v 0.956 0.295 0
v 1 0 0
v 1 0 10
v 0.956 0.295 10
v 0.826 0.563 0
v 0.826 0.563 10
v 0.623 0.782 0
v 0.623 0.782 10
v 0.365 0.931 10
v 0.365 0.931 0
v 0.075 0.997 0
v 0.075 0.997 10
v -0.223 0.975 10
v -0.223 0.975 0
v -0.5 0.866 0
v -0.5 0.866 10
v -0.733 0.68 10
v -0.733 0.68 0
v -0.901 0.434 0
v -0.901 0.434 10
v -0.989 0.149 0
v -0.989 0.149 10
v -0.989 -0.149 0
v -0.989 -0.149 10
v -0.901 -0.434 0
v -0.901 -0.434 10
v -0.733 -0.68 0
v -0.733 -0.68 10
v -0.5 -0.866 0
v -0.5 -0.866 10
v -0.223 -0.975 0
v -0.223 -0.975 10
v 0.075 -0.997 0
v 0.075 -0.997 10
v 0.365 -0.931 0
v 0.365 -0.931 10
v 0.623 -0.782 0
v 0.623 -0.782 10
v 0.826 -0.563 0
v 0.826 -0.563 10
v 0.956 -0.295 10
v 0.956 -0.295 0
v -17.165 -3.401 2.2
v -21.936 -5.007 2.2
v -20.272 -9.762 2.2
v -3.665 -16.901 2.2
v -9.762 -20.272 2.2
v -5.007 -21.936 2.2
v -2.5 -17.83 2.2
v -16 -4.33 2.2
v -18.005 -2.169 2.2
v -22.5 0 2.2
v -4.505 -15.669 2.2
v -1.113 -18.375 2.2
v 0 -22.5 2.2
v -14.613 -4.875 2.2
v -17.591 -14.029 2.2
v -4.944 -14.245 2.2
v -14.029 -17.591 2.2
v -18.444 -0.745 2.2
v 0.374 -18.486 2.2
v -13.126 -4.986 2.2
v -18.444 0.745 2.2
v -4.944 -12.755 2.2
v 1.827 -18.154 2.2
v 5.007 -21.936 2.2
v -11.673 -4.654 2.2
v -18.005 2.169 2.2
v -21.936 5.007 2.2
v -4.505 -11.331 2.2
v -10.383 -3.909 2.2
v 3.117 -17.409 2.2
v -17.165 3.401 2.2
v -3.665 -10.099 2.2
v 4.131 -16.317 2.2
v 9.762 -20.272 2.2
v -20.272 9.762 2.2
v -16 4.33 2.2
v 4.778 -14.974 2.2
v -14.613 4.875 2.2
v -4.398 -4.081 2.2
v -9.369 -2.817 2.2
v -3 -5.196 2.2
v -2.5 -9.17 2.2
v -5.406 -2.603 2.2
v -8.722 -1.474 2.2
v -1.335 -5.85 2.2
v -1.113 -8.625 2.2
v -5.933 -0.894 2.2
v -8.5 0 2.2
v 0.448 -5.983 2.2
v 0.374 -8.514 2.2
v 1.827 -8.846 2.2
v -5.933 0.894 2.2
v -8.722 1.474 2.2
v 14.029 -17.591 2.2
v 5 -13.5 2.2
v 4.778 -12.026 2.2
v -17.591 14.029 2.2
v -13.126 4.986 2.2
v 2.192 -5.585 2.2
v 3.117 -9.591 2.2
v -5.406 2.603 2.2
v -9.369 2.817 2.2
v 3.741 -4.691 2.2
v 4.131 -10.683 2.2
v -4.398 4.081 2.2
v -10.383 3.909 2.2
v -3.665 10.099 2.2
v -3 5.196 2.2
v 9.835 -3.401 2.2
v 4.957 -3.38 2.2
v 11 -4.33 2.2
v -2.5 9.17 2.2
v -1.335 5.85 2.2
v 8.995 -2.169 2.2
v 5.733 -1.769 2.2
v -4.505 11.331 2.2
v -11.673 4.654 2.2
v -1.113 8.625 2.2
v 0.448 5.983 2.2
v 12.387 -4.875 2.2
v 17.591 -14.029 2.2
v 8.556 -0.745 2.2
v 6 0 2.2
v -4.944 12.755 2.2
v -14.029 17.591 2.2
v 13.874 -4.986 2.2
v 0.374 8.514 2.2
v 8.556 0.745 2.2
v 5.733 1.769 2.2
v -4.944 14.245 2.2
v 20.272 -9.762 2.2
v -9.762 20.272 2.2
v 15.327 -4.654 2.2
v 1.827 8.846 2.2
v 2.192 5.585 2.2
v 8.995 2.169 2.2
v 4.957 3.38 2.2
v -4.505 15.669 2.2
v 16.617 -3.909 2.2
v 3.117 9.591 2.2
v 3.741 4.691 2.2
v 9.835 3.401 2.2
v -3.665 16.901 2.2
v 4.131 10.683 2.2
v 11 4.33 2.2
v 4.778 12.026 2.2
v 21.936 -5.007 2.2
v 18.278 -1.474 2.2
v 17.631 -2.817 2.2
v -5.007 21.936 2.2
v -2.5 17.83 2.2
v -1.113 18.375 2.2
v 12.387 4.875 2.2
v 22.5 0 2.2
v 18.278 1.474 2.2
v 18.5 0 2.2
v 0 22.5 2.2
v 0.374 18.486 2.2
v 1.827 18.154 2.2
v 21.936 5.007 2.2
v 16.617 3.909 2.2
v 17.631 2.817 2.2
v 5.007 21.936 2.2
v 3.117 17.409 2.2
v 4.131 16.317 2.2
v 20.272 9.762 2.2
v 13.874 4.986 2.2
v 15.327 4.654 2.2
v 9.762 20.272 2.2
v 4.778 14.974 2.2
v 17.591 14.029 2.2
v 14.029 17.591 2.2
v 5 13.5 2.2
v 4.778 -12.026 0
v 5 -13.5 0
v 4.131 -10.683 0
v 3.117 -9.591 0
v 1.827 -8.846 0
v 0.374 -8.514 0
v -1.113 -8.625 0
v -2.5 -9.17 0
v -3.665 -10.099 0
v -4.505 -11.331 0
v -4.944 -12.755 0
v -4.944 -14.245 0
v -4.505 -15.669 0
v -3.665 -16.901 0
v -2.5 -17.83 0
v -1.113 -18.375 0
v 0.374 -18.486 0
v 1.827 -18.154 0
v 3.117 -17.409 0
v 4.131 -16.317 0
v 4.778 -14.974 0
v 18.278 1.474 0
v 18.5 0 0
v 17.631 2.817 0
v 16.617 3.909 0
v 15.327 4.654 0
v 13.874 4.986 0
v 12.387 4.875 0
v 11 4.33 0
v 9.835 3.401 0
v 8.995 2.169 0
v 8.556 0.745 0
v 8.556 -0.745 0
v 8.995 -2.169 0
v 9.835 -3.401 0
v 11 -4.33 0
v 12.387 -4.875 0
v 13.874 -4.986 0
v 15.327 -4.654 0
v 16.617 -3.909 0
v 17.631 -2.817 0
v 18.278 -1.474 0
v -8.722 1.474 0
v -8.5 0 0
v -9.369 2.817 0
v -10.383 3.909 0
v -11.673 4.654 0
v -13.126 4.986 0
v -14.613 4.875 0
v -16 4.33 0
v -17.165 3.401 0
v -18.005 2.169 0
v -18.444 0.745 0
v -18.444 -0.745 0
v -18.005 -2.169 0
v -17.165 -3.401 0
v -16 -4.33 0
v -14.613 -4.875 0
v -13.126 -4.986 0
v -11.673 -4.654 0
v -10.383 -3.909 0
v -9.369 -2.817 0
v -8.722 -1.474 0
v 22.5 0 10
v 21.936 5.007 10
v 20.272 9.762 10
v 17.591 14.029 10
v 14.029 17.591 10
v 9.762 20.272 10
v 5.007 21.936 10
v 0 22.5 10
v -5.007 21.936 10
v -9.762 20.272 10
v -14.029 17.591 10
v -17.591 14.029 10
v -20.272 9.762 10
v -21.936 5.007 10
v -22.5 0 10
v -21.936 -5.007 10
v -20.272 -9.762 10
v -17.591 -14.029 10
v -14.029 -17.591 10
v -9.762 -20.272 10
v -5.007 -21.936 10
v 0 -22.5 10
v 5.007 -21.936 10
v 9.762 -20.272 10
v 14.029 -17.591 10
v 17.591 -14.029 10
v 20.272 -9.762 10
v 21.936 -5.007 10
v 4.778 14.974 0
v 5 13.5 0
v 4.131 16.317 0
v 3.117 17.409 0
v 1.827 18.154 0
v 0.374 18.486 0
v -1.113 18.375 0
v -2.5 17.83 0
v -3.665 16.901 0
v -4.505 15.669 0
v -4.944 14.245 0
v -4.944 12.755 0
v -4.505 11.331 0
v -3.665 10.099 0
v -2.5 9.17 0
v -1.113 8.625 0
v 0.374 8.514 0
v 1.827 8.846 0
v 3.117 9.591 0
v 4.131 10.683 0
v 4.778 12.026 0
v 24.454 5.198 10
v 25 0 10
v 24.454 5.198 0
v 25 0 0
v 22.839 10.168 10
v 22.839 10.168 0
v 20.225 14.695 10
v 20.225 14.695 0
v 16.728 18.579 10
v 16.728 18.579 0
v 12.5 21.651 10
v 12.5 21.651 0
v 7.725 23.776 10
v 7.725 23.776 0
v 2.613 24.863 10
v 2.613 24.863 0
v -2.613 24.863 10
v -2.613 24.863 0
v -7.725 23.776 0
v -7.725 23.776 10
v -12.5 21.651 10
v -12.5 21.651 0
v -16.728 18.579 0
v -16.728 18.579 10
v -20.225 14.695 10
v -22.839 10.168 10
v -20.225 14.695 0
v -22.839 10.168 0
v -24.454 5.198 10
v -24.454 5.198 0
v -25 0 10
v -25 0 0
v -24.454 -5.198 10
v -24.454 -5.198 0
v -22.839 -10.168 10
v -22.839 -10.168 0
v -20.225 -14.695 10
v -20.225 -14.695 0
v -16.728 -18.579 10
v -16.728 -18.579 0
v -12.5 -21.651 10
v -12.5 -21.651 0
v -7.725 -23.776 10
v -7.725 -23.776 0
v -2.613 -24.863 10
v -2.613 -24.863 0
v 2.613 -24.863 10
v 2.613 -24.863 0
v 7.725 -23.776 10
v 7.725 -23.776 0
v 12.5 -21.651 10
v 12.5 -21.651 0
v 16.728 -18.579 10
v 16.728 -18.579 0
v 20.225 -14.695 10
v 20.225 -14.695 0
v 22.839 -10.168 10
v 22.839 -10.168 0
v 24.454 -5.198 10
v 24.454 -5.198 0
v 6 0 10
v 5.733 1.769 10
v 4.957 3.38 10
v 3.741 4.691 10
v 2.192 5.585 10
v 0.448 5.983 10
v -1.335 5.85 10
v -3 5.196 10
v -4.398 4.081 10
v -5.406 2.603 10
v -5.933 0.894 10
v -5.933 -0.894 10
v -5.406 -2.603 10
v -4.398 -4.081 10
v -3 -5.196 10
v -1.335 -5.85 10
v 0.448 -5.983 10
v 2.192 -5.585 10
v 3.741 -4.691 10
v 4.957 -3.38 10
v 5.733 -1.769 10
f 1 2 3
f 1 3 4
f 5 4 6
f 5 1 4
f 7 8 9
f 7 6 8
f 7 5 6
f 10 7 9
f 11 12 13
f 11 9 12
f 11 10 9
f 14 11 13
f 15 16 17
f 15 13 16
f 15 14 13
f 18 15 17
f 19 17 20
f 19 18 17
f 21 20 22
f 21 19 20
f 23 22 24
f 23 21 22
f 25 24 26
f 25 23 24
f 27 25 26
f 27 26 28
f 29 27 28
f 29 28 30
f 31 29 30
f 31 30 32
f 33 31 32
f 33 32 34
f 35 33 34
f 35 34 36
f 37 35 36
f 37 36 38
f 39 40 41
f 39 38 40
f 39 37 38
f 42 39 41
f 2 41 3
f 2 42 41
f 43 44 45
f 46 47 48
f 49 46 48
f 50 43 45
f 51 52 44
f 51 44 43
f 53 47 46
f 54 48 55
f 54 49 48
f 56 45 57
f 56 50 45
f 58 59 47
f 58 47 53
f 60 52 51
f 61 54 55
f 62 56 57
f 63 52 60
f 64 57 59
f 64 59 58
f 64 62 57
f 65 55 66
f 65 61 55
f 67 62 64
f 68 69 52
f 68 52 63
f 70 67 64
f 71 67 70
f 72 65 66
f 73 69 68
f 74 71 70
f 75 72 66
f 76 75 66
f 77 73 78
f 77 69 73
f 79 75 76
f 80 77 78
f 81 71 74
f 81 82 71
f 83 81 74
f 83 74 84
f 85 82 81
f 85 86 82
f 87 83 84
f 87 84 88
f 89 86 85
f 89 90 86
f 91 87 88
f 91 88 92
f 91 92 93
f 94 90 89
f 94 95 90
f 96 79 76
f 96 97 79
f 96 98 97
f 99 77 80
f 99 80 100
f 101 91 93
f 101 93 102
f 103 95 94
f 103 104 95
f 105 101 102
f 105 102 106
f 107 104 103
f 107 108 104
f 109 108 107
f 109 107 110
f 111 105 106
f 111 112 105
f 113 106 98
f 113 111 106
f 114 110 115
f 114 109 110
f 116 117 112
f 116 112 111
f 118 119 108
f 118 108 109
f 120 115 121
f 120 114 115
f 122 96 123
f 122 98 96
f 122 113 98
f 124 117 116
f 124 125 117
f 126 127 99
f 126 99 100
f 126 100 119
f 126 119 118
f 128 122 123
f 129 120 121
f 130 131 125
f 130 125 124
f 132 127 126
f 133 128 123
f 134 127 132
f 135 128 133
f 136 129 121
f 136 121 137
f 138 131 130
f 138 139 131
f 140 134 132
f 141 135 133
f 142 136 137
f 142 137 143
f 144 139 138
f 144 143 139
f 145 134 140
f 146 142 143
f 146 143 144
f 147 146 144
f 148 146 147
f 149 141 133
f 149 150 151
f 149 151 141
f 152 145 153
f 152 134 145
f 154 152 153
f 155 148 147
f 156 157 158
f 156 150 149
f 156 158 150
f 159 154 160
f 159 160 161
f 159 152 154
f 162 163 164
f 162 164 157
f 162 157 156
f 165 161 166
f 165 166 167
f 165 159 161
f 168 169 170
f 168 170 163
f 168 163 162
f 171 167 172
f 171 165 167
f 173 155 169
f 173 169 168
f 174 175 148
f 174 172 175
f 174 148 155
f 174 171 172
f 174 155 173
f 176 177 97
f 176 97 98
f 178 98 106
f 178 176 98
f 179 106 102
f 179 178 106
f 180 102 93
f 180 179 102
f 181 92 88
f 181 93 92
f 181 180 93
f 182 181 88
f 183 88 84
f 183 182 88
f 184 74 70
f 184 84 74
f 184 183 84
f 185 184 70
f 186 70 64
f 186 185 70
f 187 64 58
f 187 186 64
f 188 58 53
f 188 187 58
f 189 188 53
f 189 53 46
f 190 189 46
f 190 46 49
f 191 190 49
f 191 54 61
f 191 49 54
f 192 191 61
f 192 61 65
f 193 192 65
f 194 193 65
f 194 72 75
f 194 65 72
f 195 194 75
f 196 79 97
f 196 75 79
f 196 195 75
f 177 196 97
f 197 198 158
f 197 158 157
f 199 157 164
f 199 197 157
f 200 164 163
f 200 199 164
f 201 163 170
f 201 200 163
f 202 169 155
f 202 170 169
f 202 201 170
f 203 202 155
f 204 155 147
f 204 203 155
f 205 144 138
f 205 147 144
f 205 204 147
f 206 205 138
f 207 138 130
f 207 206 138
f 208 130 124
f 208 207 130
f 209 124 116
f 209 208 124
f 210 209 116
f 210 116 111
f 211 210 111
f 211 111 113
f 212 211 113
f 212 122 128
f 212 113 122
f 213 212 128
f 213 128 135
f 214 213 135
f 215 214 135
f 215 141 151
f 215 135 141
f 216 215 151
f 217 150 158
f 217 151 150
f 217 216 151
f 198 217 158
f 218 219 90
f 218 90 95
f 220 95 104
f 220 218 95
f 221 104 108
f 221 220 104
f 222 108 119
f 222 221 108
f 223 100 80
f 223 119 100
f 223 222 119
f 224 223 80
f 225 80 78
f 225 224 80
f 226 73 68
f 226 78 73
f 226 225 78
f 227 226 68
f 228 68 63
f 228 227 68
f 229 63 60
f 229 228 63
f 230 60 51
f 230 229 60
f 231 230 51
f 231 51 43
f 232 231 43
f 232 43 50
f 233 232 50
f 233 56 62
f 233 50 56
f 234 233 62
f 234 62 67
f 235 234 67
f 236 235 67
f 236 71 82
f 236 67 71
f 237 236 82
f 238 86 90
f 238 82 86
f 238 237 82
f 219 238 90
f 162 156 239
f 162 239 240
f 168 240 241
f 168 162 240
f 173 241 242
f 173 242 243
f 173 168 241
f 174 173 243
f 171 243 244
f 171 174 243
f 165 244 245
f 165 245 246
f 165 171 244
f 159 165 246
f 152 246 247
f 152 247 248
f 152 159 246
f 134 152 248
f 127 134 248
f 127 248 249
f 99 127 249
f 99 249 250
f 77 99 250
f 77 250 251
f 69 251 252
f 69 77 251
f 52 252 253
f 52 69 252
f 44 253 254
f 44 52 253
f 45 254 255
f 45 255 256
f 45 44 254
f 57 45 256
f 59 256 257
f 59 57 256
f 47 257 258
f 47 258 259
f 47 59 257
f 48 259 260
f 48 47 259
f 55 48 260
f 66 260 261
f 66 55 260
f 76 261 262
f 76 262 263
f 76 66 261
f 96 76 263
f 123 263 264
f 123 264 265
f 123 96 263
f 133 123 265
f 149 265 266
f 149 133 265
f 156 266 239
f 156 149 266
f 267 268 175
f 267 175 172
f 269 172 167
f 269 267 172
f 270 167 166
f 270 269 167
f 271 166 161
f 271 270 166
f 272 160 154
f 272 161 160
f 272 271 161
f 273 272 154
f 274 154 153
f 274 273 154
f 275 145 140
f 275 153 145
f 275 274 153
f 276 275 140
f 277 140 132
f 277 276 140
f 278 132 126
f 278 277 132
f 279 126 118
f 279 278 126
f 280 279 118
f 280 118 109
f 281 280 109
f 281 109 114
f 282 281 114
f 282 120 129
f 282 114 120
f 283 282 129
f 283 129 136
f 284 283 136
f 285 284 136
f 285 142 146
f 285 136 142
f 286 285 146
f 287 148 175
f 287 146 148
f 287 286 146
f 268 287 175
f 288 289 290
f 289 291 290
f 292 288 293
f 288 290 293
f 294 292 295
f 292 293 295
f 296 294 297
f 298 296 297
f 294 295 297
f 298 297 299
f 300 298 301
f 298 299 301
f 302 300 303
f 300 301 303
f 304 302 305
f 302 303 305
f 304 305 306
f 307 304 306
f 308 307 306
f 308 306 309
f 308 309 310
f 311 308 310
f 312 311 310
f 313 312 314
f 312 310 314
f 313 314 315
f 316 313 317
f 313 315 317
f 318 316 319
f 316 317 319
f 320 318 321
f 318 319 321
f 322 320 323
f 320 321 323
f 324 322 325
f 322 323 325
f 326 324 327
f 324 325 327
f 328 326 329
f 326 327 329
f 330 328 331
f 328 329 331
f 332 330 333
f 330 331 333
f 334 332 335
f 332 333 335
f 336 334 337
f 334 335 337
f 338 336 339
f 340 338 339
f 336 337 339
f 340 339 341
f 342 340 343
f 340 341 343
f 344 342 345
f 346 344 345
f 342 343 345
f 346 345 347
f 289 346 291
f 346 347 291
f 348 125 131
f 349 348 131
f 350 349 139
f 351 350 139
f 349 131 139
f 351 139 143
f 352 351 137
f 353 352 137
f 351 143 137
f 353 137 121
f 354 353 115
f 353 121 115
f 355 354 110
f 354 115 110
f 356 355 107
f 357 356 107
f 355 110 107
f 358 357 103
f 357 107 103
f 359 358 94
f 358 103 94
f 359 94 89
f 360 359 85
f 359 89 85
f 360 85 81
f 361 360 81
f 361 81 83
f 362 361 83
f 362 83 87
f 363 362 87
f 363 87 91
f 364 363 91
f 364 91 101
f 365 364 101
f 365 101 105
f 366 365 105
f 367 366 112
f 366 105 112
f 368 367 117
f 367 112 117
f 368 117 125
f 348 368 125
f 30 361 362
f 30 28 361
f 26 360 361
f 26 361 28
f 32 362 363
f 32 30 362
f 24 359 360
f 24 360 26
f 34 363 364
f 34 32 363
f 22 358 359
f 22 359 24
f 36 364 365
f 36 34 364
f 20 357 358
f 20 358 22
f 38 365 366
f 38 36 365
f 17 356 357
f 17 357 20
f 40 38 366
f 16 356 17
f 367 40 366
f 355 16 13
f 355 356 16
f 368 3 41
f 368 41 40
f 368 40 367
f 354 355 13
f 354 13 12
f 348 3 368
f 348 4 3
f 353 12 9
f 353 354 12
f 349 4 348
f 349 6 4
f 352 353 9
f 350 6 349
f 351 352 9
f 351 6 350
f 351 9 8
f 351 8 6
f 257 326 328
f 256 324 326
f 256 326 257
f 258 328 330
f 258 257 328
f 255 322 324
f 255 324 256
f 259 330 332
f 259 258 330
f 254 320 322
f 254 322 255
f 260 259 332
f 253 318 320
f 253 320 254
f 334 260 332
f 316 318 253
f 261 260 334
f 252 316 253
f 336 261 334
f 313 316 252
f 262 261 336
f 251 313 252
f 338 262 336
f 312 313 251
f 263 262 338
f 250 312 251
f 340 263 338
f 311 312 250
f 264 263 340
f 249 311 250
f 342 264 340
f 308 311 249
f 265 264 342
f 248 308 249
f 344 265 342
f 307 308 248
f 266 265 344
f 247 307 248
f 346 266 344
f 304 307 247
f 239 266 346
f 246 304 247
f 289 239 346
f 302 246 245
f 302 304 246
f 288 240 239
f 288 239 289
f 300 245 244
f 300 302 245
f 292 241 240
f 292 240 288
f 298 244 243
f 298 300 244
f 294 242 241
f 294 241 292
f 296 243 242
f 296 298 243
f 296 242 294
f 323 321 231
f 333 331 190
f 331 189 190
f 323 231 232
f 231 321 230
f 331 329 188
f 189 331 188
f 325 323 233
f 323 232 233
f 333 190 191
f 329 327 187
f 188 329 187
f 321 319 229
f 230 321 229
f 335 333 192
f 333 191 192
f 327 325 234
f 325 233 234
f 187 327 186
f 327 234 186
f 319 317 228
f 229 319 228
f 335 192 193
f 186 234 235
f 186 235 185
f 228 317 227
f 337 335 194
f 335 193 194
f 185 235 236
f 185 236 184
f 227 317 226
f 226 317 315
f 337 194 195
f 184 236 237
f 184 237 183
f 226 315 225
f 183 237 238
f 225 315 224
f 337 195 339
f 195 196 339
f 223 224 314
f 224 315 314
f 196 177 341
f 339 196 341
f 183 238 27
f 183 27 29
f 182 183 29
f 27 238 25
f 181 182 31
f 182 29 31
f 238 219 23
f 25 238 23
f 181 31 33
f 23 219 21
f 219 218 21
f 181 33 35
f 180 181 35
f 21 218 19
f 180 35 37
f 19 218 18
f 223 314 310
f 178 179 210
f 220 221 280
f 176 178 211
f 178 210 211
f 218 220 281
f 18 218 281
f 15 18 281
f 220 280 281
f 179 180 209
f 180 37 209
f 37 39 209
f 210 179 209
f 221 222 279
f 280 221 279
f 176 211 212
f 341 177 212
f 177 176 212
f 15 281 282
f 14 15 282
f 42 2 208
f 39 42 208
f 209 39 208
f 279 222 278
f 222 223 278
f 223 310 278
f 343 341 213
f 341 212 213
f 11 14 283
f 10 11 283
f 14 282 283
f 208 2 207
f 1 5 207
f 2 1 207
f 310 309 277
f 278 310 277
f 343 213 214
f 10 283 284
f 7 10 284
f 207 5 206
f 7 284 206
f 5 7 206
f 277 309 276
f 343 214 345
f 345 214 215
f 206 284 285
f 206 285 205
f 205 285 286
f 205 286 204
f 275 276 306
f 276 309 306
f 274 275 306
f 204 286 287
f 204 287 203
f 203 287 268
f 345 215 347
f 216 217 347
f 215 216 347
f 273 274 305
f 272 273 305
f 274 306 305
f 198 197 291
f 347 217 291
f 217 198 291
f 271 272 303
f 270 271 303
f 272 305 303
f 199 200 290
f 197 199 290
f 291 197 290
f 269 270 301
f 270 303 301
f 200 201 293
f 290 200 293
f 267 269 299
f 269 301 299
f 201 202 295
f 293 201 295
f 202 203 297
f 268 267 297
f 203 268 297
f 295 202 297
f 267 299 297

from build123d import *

# Parameters (mm, degrees)
SKETCH1_R                 = 25
WHEEL_WEB_50MM_DEPTH      = 2.2
OUTER_RIM_10MM_WIDE_START = 2.2
SKETCH2_R                 = 25
SKETCH2_R_2               = 22.5
OUTER_RIM_10MM_WIDE_DEPTH = 7.8
HUB_12MM_START            = 2.2
SKETCH3_R                 = 6
HUB_12MM_DEPTH            = 7.8
AXLE_BORE_FIT_CHECK_START = -0.1
SKETCH4_R                 = 1
AXLE_BORE_FIT_CHECK_DEPTH = 10.2
LIGHTENING_X_13_5_START   = -0.1
SKETCH5_R                 = 5
LIGHTENING_X_13_5_DEPTH   = 10.2
SKETCH6_R                 = 5
LIGHTENING_X_13_5_2_DEPTH = 10.2
LIGHTENING_Y_13_5_START   = -0.1
SKETCH7_R                 = 5
LIGHTENING_Y_13_5_DEPTH   = 10.2
SKETCH8_R                 = 5
LIGHTENING_Y_13_5_2_DEPTH = 10.2


with BuildPart() as part:
    # Sketch1 → Wheel_Web_50mm (new body)
    with BuildSketch(Plane.XY):
        Circle(SKETCH1_R)
    extrude(amount=WHEEL_WEB_50MM_DEPTH)

    # Sketch2 → Outer_Rim_10mm_Wide (add)
    with BuildSketch(Plane.XY.offset(OUTER_RIM_10MM_WIDE_START)):
        Circle(SKETCH2_R)
        Circle(SKETCH2_R_2, mode=Mode.SUBTRACT)
    extrude(amount=OUTER_RIM_10MM_WIDE_DEPTH)

    # Sketch3 → Hub_12mm (add)
    with BuildSketch(Plane.XY.offset(HUB_12MM_START)):
        Circle(SKETCH3_R)
    extrude(amount=HUB_12MM_DEPTH)

    # Sketch4 → Axle_Bore_FIT_CHECK (cut)
    with BuildSketch(Plane.XY.offset(AXLE_BORE_FIT_CHECK_START)):
        Circle(SKETCH4_R)
    extrude(amount=AXLE_BORE_FIT_CHECK_DEPTH, mode=Mode.SUBTRACT)

    # Sketch5 → Lightening_X_-13.5 (cut)
    with BuildSketch(Plane.XY.offset(LIGHTENING_X_13_5_START)):
        with Locations((-13.5, 0)):
            Circle(SKETCH5_R)
    extrude(amount=LIGHTENING_X_13_5_DEPTH, mode=Mode.SUBTRACT)

    # Sketch6 → Lightening_X_13.5 2 (cut)
    with BuildSketch(Plane.XY.offset(LIGHTENING_X_13_5_START)):
        with Locations((13.5, 0)):
            Circle(SKETCH6_R)
    extrude(amount=LIGHTENING_X_13_5_2_DEPTH, mode=Mode.SUBTRACT)

    # Sketch7 → Lightening_Y_-13.5 (cut)
    with BuildSketch(Plane.XY.offset(LIGHTENING_Y_13_5_START)):
        with Locations((0, -13.5)):
            Circle(SKETCH7_R)
    extrude(amount=LIGHTENING_Y_13_5_DEPTH, mode=Mode.SUBTRACT)

    # Sketch8 → Lightening_Y_13.5 2 (cut)
    with BuildSketch(Plane.XY.offset(LIGHTENING_Y_13_5_START)):
        with Locations((0, 13.5)):
            Circle(SKETCH8_R)
    extrude(amount=LIGHTENING_Y_13_5_2_DEPTH, mode=Mode.SUBTRACT)


solid = part.part
